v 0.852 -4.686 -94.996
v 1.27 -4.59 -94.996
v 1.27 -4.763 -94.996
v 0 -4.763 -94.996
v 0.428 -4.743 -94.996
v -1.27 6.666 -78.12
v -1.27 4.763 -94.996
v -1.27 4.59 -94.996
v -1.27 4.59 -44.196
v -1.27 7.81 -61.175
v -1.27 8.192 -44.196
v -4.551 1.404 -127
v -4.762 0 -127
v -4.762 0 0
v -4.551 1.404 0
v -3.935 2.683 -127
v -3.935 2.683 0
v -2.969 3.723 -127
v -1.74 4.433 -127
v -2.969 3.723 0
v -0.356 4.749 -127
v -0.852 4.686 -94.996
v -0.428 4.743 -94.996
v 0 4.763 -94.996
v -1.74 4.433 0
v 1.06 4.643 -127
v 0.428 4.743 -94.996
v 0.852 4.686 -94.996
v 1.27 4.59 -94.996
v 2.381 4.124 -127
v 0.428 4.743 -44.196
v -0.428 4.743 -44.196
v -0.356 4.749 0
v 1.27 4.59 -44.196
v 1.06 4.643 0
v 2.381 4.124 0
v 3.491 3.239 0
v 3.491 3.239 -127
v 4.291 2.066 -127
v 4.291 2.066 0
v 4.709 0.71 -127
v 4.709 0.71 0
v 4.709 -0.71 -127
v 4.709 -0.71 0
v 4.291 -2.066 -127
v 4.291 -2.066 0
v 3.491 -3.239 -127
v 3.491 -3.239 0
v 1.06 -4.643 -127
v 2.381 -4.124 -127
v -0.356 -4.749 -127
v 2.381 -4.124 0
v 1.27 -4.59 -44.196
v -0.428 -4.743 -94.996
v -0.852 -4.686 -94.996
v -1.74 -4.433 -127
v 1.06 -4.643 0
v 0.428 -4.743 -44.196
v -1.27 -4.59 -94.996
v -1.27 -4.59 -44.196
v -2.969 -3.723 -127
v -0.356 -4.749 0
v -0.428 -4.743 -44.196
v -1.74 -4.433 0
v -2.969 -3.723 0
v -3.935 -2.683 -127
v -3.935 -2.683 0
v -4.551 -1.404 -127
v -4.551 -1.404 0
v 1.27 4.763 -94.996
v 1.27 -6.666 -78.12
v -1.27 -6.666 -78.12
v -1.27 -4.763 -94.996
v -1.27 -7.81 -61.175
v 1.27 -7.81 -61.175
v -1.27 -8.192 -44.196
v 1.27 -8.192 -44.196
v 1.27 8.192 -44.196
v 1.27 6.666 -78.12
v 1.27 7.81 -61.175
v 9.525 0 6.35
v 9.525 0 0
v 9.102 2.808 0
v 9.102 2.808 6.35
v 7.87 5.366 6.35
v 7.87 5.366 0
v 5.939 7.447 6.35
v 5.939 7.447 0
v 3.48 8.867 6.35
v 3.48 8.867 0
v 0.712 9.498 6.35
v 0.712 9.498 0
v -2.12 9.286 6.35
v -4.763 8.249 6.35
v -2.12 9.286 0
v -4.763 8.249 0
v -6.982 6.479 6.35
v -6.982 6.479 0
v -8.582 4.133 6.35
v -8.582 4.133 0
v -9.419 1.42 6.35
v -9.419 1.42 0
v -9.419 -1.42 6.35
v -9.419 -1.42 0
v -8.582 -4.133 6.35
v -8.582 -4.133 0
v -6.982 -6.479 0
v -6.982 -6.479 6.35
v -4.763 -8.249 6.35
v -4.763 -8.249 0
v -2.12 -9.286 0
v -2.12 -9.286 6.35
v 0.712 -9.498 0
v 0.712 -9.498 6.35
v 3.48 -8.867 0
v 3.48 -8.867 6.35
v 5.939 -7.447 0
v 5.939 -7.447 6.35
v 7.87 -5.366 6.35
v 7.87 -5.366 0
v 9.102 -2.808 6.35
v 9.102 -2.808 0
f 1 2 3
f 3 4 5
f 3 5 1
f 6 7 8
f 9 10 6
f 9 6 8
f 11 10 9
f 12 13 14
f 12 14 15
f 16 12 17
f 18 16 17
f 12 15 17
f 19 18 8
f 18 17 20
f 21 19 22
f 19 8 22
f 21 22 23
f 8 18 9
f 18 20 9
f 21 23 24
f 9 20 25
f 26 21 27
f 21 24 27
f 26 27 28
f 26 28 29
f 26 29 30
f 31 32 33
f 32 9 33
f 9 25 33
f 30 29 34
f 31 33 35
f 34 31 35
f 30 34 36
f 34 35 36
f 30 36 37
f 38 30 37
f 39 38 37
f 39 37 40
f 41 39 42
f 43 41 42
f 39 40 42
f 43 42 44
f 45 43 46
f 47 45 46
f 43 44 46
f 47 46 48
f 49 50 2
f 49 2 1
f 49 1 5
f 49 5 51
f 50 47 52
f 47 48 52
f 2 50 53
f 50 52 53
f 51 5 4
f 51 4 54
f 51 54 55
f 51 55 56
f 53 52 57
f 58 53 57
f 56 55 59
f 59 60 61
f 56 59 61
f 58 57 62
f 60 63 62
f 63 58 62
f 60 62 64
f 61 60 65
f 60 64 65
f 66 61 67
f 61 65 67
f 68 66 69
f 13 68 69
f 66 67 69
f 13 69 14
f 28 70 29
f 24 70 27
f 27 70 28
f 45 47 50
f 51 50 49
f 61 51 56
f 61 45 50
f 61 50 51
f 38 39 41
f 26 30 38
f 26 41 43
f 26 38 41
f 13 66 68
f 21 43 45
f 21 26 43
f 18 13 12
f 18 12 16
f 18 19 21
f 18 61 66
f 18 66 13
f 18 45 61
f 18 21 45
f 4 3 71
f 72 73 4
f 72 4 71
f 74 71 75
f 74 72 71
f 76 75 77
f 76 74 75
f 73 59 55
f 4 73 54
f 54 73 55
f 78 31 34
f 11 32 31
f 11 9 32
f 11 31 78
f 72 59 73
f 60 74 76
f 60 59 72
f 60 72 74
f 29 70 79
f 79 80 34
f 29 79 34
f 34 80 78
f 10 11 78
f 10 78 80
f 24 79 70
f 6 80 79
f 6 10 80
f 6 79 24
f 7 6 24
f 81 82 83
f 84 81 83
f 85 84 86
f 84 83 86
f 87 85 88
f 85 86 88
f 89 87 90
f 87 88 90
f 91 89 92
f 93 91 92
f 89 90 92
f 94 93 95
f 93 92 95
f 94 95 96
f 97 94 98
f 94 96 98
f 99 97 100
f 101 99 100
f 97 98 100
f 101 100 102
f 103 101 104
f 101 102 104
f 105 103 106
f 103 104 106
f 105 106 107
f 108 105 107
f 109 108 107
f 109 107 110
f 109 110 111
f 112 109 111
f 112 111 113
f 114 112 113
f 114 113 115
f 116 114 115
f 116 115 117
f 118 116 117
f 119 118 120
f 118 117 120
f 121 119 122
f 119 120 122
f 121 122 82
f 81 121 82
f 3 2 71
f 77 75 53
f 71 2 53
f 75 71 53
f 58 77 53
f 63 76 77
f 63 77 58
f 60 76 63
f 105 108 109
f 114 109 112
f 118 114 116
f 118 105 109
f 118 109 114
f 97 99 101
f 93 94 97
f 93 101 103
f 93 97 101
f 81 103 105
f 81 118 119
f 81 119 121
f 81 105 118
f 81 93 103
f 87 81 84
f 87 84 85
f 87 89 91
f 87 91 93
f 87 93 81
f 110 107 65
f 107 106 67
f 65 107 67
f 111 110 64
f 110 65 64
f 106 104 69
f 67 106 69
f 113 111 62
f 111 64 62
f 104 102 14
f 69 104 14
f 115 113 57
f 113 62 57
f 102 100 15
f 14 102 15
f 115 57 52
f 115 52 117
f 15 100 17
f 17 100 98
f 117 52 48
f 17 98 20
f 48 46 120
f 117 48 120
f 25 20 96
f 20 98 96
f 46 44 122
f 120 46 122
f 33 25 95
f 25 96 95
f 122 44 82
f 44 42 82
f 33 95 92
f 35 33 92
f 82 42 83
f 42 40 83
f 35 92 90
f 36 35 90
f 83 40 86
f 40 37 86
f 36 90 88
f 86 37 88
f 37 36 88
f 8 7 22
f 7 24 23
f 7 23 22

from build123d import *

# Parameters (mm, degrees)
SKETCH1_R                = 9.525
BOSS_EXTRUDE1_DEPTH      = 6.35
SKETCH2_R                = 4.7625
BOSS_EXTRUDE2_DEPTH      = 127
BOSS_EXTRUDE3_DEPTH      = 1.27
BOSS_EXTRUDE3_DEPTH_BACK = 1.27


with BuildPart() as part:
    # Sketch1 → Boss-Extrude1 (new body)
    with BuildSketch(Plane.XY):
        Circle(SKETCH1_R)
    extrude(amount=BOSS_EXTRUDE1_DEPTH)

    # Sketch2 → Boss-Extrude2 (add)
    with BuildSketch(Plane(origin=(0, 0, 0), x_dir=(-1, 0, 0), z_dir=(0, 0, -1))):
        Circle(SKETCH2_R)
    extrude(amount=BOSS_EXTRUDE2_DEPTH)

    # Sketch3 → Boss-Extrude3 (add, two sides: drawn at the far end of the back side and taken through both)
    with BuildSketch(Plane(origin=(0, 0, 0), x_dir=(0, 0, -1), z_dir=(1, 0, 0)).offset(-BOSS_EXTRUDE3_DEPTH_BACK)):
        with BuildLine():
            Line((44.196, -4.7625), (44.196, 4.7625))
            Line((44.196, 4.7625), (44.196, 8.1915))
            ThreePointArc((44.196, 8.1915), (69.653798614, 7.333275757), (94.996, 4.7625))
            Line((94.996, 4.7625), (94.996, -4.7625))
            ThreePointArc((94.996, -4.7625), (69.653798614, -7.333275757), (44.196, -8.1915))
            Line((44.196, -8.1915), (44.196, -4.7625))
        make_face()
    extrude(amount=BOSS_EXTRUDE3_DEPTH + BOSS_EXTRUDE3_DEPTH_BACK)


solid = part.part
